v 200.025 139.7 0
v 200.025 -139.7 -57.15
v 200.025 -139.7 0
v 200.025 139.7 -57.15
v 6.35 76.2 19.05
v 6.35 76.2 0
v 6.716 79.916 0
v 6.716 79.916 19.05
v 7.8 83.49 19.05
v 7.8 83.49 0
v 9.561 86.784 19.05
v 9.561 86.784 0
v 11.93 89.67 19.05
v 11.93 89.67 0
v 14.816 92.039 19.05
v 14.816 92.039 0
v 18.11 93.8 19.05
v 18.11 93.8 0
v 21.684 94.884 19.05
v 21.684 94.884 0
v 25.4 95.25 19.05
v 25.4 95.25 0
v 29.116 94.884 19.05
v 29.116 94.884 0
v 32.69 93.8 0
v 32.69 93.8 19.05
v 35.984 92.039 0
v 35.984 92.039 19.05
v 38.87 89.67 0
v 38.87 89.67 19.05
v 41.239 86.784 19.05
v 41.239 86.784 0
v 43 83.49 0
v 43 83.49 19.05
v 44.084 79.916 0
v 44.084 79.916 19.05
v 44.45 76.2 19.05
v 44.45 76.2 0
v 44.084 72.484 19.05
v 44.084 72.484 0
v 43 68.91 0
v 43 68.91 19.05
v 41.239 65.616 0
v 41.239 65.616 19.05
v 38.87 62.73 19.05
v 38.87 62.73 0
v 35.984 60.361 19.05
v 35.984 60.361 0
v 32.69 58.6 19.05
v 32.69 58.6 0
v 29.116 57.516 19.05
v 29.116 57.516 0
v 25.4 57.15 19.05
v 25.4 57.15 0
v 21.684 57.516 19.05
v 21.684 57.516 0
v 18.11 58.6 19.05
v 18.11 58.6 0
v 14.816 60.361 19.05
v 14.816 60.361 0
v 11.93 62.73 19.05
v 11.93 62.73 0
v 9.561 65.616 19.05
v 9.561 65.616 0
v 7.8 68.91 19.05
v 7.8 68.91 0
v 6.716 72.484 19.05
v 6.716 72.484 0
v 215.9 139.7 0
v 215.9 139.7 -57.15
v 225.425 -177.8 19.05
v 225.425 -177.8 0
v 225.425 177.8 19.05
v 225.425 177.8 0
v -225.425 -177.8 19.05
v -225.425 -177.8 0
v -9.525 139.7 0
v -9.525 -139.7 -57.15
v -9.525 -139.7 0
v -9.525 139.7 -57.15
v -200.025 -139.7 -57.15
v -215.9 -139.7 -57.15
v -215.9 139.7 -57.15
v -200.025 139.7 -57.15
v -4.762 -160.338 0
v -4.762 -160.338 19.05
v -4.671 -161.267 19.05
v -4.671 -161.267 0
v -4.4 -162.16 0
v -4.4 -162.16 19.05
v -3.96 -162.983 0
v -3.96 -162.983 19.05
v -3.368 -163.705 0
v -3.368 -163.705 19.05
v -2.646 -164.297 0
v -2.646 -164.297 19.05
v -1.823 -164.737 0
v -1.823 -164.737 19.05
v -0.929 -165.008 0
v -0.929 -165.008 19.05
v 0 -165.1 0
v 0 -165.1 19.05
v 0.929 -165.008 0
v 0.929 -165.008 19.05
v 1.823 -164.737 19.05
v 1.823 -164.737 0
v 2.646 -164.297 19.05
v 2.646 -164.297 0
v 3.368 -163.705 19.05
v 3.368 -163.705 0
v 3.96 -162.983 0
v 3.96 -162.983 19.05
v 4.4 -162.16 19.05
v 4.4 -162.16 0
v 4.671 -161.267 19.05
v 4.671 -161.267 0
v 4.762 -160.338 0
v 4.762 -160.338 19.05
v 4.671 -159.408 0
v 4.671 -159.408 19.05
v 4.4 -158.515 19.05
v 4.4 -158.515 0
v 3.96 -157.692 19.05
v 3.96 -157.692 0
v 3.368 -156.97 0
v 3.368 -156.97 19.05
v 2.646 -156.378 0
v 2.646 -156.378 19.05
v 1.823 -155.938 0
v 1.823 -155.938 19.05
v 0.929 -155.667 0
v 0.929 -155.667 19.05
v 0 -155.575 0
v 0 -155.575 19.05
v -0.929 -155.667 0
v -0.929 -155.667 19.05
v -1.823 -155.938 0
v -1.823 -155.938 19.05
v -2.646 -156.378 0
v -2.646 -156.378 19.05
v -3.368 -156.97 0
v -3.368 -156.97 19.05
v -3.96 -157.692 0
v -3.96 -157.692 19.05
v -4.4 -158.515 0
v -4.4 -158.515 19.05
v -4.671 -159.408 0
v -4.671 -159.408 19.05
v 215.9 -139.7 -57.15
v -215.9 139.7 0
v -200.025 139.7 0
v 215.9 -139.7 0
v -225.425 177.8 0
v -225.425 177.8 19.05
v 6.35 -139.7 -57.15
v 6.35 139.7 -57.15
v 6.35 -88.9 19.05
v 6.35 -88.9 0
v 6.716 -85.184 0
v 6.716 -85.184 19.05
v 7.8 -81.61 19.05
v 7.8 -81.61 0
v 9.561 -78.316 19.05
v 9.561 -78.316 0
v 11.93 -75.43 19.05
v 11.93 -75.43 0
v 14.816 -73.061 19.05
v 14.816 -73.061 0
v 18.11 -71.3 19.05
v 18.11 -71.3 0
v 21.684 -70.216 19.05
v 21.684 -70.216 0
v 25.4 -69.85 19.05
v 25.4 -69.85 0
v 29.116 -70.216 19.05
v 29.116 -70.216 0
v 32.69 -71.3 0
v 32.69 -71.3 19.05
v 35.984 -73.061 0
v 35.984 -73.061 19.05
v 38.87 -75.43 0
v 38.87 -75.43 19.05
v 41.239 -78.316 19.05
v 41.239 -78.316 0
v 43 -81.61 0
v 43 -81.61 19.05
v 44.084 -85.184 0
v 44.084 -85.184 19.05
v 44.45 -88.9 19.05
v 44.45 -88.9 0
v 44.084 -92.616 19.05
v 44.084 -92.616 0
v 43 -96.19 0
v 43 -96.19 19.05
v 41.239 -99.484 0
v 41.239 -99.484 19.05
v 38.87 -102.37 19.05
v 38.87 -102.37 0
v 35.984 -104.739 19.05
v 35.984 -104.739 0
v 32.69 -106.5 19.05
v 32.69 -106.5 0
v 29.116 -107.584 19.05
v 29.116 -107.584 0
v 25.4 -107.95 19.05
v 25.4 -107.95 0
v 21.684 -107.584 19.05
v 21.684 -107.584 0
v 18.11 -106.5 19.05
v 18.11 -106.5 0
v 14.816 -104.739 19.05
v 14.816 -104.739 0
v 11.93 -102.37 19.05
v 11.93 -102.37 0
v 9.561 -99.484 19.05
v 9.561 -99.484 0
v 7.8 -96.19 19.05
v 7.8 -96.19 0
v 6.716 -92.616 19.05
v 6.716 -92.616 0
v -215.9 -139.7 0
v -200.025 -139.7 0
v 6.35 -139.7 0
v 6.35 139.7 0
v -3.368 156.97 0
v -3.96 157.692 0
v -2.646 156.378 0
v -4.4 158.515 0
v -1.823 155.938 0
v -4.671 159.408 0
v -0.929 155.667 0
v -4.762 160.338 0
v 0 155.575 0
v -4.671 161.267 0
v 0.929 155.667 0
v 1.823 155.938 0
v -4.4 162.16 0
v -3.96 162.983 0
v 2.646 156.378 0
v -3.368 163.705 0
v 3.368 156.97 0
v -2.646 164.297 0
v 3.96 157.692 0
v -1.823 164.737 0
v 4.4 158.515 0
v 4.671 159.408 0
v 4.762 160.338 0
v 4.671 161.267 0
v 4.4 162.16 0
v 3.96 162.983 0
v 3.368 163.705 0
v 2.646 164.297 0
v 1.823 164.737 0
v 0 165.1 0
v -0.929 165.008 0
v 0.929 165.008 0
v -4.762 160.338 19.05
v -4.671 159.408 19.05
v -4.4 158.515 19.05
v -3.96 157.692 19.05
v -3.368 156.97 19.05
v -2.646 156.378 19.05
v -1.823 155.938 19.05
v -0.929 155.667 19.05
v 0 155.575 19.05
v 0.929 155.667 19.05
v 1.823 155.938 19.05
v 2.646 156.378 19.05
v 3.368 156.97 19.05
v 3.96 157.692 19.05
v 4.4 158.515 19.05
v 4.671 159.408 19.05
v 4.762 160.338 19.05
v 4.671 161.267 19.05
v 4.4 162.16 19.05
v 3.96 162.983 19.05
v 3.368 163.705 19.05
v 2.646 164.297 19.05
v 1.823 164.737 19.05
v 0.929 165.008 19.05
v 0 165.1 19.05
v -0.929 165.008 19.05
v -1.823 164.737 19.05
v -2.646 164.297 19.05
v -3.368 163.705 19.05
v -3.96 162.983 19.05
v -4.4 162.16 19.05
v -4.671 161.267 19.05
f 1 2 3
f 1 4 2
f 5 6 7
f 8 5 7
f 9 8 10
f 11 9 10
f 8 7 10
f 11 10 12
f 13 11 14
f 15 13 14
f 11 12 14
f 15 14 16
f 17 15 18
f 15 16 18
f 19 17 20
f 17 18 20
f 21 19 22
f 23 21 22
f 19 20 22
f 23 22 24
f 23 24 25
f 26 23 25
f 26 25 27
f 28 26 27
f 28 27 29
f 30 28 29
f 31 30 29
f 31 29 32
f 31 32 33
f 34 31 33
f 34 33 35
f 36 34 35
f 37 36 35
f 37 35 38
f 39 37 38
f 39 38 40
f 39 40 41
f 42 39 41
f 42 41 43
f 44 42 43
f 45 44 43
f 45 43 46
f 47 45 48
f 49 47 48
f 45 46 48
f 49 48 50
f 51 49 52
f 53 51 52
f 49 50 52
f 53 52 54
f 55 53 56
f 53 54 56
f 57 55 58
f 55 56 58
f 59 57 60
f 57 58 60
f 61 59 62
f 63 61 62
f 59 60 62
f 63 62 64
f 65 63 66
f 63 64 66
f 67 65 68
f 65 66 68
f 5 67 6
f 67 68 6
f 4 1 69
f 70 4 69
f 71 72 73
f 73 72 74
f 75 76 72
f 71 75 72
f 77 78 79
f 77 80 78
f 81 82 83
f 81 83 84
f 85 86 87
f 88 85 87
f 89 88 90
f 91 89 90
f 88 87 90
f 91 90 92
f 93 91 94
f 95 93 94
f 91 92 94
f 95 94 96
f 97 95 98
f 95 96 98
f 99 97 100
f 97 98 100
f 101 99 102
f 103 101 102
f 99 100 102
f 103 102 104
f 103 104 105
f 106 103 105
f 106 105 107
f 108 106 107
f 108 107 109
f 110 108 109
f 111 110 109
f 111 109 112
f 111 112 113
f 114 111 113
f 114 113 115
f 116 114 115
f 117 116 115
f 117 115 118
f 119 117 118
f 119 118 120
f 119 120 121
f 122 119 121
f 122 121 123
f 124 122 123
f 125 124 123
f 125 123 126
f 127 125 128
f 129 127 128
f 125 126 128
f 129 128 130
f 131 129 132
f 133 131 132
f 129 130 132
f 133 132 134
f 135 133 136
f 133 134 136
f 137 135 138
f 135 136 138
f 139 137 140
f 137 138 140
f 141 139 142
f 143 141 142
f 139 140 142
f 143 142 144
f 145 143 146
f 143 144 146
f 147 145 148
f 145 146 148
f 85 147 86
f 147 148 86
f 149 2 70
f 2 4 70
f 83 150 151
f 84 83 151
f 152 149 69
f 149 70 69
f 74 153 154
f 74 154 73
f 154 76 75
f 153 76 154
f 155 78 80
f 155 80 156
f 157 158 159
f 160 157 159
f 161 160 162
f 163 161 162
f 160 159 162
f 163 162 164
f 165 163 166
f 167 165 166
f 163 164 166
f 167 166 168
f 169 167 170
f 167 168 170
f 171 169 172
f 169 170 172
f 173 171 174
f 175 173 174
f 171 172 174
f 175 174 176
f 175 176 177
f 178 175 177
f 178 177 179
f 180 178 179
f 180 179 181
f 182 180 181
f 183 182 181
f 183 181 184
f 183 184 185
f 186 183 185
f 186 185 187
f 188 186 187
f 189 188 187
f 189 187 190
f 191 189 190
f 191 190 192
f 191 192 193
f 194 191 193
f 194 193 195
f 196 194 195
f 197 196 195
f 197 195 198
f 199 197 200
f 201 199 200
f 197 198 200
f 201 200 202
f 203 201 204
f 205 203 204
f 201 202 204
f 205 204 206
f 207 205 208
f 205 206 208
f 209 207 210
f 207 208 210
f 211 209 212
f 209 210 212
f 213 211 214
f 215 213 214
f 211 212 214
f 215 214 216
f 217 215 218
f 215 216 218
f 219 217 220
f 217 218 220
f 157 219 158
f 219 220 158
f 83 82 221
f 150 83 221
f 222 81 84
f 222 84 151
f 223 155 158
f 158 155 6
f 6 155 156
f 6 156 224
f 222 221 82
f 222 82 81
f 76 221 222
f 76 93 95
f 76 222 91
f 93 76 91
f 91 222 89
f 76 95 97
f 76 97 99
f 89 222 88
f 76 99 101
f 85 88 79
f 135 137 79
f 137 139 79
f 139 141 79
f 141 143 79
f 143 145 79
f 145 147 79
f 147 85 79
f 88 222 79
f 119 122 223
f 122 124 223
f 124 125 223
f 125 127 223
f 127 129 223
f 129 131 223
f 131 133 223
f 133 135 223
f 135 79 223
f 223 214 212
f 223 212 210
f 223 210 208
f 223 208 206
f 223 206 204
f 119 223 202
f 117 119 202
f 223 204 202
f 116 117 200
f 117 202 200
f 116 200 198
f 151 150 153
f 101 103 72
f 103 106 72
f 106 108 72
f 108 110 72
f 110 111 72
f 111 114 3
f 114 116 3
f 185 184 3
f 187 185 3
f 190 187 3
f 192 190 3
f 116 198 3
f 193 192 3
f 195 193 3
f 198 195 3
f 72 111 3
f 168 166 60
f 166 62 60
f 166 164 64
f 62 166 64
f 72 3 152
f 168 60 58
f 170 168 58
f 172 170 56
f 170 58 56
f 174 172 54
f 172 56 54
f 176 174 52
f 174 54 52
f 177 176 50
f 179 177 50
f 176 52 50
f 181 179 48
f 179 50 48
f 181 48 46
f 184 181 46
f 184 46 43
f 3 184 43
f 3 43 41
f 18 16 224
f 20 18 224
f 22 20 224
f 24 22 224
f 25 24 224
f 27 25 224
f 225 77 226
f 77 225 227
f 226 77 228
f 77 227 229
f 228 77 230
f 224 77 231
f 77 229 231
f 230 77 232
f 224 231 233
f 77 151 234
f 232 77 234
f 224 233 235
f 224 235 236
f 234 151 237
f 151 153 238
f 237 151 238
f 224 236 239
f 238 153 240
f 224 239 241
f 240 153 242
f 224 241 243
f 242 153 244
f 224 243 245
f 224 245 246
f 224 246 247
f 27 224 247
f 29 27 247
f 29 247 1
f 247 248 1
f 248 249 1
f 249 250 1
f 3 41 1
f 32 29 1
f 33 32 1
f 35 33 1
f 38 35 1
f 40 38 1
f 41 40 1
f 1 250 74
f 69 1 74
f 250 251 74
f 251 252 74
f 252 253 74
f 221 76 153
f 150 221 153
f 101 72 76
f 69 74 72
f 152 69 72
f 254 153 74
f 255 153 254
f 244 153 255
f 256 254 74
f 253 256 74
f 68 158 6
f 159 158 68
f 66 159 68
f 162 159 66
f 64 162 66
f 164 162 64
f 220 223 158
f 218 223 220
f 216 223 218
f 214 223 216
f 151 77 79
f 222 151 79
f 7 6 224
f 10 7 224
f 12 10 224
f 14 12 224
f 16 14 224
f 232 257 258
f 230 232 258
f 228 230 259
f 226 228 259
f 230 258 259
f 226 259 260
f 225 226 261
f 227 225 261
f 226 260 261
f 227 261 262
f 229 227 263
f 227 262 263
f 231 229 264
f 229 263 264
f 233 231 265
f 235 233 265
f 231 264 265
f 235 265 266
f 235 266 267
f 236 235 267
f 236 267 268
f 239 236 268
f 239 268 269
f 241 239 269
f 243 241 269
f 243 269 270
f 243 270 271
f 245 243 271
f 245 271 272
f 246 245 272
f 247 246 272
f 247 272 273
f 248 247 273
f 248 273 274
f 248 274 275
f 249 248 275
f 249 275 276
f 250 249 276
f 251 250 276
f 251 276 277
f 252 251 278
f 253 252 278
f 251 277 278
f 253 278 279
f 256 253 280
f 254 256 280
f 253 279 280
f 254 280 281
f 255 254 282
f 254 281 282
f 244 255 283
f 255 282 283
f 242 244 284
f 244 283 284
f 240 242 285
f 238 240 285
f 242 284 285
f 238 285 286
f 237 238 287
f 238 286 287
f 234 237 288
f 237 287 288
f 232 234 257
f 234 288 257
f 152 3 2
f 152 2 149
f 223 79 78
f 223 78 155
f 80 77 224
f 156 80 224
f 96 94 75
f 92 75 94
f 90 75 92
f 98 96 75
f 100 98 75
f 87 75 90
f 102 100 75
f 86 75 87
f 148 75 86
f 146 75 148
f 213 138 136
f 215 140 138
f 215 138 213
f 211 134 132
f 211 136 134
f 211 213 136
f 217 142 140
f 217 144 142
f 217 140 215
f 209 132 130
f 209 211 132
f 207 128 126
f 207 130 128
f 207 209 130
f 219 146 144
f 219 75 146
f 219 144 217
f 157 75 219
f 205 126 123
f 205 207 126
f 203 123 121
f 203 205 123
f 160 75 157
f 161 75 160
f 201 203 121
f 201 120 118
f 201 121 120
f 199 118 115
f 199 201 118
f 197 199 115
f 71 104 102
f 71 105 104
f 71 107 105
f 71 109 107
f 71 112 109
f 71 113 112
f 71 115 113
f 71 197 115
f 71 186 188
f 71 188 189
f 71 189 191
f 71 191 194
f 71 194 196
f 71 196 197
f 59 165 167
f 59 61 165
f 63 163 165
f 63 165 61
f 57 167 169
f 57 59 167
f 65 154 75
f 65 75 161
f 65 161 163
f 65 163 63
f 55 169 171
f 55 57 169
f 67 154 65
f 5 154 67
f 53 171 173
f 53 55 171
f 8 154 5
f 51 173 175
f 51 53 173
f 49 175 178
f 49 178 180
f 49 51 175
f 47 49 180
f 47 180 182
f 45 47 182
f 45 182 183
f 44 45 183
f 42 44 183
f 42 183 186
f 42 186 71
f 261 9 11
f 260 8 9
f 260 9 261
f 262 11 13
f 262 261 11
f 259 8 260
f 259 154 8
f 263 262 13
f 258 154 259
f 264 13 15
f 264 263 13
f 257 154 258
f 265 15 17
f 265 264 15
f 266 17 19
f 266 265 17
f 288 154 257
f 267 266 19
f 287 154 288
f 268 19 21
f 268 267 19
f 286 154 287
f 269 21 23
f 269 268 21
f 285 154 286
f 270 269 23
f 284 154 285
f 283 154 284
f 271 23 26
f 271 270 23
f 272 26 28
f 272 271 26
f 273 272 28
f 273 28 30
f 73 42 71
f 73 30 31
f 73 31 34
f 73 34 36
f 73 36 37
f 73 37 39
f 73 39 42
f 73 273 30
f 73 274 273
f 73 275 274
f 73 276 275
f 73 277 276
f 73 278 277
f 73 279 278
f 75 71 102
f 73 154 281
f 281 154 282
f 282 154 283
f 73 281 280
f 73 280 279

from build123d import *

# Parameters (mm, degrees)
F0_W     = 450.85
F0_H     = 355.6
F1_DEPTH = 19.05
F3_D     = 38.1
F5_D     = 9.525
F6_W     = 15.875
F6_H     = 57.15
F7_DEPTH = 139.7


# Not quite as in the source:
# - a length typed as a fraction of an inch, garbled in the dataset ("3 / 203.2 mm" for 3/8 in), is restored


with BuildPart() as f1:
    # F0 (on Top) → F1 (new body)
    with BuildSketch(Plane.XY):
        Rectangle(F0_W, F0_H)
    extrude(amount=F1_DEPTH)

    # F3 (through all)
    with Locations(Plane.XY.offset(19.05)):
        with Locations((25.4, 76.2), (25.4, -88.9)):
            Hole(F3_D / 2)

    # F5 (through all)
    with Locations(Plane(origin=(0, 0, 0), x_dir=(1, 0, 0), z_dir=(0, 0, -1))):
        with Locations((0, 160.3375), (0, -160.3375)):
            Hole(F5_D / 2)

    # F6 (on Front) → F7 (join, symmetric)
    with BuildSketch(Plane.XZ):
        with Locations((207.9625, -28.575)):
            Rectangle(F6_W, F6_H)
        with Locations((-1.5875, -28.575)):
            Rectangle(F6_W, F6_H)
        with Locations((-207.9625, -28.575)):
            Rectangle(F6_W, F6_H)
    extrude(amount=F7_DEPTH, both=True)


solid = f1.part
